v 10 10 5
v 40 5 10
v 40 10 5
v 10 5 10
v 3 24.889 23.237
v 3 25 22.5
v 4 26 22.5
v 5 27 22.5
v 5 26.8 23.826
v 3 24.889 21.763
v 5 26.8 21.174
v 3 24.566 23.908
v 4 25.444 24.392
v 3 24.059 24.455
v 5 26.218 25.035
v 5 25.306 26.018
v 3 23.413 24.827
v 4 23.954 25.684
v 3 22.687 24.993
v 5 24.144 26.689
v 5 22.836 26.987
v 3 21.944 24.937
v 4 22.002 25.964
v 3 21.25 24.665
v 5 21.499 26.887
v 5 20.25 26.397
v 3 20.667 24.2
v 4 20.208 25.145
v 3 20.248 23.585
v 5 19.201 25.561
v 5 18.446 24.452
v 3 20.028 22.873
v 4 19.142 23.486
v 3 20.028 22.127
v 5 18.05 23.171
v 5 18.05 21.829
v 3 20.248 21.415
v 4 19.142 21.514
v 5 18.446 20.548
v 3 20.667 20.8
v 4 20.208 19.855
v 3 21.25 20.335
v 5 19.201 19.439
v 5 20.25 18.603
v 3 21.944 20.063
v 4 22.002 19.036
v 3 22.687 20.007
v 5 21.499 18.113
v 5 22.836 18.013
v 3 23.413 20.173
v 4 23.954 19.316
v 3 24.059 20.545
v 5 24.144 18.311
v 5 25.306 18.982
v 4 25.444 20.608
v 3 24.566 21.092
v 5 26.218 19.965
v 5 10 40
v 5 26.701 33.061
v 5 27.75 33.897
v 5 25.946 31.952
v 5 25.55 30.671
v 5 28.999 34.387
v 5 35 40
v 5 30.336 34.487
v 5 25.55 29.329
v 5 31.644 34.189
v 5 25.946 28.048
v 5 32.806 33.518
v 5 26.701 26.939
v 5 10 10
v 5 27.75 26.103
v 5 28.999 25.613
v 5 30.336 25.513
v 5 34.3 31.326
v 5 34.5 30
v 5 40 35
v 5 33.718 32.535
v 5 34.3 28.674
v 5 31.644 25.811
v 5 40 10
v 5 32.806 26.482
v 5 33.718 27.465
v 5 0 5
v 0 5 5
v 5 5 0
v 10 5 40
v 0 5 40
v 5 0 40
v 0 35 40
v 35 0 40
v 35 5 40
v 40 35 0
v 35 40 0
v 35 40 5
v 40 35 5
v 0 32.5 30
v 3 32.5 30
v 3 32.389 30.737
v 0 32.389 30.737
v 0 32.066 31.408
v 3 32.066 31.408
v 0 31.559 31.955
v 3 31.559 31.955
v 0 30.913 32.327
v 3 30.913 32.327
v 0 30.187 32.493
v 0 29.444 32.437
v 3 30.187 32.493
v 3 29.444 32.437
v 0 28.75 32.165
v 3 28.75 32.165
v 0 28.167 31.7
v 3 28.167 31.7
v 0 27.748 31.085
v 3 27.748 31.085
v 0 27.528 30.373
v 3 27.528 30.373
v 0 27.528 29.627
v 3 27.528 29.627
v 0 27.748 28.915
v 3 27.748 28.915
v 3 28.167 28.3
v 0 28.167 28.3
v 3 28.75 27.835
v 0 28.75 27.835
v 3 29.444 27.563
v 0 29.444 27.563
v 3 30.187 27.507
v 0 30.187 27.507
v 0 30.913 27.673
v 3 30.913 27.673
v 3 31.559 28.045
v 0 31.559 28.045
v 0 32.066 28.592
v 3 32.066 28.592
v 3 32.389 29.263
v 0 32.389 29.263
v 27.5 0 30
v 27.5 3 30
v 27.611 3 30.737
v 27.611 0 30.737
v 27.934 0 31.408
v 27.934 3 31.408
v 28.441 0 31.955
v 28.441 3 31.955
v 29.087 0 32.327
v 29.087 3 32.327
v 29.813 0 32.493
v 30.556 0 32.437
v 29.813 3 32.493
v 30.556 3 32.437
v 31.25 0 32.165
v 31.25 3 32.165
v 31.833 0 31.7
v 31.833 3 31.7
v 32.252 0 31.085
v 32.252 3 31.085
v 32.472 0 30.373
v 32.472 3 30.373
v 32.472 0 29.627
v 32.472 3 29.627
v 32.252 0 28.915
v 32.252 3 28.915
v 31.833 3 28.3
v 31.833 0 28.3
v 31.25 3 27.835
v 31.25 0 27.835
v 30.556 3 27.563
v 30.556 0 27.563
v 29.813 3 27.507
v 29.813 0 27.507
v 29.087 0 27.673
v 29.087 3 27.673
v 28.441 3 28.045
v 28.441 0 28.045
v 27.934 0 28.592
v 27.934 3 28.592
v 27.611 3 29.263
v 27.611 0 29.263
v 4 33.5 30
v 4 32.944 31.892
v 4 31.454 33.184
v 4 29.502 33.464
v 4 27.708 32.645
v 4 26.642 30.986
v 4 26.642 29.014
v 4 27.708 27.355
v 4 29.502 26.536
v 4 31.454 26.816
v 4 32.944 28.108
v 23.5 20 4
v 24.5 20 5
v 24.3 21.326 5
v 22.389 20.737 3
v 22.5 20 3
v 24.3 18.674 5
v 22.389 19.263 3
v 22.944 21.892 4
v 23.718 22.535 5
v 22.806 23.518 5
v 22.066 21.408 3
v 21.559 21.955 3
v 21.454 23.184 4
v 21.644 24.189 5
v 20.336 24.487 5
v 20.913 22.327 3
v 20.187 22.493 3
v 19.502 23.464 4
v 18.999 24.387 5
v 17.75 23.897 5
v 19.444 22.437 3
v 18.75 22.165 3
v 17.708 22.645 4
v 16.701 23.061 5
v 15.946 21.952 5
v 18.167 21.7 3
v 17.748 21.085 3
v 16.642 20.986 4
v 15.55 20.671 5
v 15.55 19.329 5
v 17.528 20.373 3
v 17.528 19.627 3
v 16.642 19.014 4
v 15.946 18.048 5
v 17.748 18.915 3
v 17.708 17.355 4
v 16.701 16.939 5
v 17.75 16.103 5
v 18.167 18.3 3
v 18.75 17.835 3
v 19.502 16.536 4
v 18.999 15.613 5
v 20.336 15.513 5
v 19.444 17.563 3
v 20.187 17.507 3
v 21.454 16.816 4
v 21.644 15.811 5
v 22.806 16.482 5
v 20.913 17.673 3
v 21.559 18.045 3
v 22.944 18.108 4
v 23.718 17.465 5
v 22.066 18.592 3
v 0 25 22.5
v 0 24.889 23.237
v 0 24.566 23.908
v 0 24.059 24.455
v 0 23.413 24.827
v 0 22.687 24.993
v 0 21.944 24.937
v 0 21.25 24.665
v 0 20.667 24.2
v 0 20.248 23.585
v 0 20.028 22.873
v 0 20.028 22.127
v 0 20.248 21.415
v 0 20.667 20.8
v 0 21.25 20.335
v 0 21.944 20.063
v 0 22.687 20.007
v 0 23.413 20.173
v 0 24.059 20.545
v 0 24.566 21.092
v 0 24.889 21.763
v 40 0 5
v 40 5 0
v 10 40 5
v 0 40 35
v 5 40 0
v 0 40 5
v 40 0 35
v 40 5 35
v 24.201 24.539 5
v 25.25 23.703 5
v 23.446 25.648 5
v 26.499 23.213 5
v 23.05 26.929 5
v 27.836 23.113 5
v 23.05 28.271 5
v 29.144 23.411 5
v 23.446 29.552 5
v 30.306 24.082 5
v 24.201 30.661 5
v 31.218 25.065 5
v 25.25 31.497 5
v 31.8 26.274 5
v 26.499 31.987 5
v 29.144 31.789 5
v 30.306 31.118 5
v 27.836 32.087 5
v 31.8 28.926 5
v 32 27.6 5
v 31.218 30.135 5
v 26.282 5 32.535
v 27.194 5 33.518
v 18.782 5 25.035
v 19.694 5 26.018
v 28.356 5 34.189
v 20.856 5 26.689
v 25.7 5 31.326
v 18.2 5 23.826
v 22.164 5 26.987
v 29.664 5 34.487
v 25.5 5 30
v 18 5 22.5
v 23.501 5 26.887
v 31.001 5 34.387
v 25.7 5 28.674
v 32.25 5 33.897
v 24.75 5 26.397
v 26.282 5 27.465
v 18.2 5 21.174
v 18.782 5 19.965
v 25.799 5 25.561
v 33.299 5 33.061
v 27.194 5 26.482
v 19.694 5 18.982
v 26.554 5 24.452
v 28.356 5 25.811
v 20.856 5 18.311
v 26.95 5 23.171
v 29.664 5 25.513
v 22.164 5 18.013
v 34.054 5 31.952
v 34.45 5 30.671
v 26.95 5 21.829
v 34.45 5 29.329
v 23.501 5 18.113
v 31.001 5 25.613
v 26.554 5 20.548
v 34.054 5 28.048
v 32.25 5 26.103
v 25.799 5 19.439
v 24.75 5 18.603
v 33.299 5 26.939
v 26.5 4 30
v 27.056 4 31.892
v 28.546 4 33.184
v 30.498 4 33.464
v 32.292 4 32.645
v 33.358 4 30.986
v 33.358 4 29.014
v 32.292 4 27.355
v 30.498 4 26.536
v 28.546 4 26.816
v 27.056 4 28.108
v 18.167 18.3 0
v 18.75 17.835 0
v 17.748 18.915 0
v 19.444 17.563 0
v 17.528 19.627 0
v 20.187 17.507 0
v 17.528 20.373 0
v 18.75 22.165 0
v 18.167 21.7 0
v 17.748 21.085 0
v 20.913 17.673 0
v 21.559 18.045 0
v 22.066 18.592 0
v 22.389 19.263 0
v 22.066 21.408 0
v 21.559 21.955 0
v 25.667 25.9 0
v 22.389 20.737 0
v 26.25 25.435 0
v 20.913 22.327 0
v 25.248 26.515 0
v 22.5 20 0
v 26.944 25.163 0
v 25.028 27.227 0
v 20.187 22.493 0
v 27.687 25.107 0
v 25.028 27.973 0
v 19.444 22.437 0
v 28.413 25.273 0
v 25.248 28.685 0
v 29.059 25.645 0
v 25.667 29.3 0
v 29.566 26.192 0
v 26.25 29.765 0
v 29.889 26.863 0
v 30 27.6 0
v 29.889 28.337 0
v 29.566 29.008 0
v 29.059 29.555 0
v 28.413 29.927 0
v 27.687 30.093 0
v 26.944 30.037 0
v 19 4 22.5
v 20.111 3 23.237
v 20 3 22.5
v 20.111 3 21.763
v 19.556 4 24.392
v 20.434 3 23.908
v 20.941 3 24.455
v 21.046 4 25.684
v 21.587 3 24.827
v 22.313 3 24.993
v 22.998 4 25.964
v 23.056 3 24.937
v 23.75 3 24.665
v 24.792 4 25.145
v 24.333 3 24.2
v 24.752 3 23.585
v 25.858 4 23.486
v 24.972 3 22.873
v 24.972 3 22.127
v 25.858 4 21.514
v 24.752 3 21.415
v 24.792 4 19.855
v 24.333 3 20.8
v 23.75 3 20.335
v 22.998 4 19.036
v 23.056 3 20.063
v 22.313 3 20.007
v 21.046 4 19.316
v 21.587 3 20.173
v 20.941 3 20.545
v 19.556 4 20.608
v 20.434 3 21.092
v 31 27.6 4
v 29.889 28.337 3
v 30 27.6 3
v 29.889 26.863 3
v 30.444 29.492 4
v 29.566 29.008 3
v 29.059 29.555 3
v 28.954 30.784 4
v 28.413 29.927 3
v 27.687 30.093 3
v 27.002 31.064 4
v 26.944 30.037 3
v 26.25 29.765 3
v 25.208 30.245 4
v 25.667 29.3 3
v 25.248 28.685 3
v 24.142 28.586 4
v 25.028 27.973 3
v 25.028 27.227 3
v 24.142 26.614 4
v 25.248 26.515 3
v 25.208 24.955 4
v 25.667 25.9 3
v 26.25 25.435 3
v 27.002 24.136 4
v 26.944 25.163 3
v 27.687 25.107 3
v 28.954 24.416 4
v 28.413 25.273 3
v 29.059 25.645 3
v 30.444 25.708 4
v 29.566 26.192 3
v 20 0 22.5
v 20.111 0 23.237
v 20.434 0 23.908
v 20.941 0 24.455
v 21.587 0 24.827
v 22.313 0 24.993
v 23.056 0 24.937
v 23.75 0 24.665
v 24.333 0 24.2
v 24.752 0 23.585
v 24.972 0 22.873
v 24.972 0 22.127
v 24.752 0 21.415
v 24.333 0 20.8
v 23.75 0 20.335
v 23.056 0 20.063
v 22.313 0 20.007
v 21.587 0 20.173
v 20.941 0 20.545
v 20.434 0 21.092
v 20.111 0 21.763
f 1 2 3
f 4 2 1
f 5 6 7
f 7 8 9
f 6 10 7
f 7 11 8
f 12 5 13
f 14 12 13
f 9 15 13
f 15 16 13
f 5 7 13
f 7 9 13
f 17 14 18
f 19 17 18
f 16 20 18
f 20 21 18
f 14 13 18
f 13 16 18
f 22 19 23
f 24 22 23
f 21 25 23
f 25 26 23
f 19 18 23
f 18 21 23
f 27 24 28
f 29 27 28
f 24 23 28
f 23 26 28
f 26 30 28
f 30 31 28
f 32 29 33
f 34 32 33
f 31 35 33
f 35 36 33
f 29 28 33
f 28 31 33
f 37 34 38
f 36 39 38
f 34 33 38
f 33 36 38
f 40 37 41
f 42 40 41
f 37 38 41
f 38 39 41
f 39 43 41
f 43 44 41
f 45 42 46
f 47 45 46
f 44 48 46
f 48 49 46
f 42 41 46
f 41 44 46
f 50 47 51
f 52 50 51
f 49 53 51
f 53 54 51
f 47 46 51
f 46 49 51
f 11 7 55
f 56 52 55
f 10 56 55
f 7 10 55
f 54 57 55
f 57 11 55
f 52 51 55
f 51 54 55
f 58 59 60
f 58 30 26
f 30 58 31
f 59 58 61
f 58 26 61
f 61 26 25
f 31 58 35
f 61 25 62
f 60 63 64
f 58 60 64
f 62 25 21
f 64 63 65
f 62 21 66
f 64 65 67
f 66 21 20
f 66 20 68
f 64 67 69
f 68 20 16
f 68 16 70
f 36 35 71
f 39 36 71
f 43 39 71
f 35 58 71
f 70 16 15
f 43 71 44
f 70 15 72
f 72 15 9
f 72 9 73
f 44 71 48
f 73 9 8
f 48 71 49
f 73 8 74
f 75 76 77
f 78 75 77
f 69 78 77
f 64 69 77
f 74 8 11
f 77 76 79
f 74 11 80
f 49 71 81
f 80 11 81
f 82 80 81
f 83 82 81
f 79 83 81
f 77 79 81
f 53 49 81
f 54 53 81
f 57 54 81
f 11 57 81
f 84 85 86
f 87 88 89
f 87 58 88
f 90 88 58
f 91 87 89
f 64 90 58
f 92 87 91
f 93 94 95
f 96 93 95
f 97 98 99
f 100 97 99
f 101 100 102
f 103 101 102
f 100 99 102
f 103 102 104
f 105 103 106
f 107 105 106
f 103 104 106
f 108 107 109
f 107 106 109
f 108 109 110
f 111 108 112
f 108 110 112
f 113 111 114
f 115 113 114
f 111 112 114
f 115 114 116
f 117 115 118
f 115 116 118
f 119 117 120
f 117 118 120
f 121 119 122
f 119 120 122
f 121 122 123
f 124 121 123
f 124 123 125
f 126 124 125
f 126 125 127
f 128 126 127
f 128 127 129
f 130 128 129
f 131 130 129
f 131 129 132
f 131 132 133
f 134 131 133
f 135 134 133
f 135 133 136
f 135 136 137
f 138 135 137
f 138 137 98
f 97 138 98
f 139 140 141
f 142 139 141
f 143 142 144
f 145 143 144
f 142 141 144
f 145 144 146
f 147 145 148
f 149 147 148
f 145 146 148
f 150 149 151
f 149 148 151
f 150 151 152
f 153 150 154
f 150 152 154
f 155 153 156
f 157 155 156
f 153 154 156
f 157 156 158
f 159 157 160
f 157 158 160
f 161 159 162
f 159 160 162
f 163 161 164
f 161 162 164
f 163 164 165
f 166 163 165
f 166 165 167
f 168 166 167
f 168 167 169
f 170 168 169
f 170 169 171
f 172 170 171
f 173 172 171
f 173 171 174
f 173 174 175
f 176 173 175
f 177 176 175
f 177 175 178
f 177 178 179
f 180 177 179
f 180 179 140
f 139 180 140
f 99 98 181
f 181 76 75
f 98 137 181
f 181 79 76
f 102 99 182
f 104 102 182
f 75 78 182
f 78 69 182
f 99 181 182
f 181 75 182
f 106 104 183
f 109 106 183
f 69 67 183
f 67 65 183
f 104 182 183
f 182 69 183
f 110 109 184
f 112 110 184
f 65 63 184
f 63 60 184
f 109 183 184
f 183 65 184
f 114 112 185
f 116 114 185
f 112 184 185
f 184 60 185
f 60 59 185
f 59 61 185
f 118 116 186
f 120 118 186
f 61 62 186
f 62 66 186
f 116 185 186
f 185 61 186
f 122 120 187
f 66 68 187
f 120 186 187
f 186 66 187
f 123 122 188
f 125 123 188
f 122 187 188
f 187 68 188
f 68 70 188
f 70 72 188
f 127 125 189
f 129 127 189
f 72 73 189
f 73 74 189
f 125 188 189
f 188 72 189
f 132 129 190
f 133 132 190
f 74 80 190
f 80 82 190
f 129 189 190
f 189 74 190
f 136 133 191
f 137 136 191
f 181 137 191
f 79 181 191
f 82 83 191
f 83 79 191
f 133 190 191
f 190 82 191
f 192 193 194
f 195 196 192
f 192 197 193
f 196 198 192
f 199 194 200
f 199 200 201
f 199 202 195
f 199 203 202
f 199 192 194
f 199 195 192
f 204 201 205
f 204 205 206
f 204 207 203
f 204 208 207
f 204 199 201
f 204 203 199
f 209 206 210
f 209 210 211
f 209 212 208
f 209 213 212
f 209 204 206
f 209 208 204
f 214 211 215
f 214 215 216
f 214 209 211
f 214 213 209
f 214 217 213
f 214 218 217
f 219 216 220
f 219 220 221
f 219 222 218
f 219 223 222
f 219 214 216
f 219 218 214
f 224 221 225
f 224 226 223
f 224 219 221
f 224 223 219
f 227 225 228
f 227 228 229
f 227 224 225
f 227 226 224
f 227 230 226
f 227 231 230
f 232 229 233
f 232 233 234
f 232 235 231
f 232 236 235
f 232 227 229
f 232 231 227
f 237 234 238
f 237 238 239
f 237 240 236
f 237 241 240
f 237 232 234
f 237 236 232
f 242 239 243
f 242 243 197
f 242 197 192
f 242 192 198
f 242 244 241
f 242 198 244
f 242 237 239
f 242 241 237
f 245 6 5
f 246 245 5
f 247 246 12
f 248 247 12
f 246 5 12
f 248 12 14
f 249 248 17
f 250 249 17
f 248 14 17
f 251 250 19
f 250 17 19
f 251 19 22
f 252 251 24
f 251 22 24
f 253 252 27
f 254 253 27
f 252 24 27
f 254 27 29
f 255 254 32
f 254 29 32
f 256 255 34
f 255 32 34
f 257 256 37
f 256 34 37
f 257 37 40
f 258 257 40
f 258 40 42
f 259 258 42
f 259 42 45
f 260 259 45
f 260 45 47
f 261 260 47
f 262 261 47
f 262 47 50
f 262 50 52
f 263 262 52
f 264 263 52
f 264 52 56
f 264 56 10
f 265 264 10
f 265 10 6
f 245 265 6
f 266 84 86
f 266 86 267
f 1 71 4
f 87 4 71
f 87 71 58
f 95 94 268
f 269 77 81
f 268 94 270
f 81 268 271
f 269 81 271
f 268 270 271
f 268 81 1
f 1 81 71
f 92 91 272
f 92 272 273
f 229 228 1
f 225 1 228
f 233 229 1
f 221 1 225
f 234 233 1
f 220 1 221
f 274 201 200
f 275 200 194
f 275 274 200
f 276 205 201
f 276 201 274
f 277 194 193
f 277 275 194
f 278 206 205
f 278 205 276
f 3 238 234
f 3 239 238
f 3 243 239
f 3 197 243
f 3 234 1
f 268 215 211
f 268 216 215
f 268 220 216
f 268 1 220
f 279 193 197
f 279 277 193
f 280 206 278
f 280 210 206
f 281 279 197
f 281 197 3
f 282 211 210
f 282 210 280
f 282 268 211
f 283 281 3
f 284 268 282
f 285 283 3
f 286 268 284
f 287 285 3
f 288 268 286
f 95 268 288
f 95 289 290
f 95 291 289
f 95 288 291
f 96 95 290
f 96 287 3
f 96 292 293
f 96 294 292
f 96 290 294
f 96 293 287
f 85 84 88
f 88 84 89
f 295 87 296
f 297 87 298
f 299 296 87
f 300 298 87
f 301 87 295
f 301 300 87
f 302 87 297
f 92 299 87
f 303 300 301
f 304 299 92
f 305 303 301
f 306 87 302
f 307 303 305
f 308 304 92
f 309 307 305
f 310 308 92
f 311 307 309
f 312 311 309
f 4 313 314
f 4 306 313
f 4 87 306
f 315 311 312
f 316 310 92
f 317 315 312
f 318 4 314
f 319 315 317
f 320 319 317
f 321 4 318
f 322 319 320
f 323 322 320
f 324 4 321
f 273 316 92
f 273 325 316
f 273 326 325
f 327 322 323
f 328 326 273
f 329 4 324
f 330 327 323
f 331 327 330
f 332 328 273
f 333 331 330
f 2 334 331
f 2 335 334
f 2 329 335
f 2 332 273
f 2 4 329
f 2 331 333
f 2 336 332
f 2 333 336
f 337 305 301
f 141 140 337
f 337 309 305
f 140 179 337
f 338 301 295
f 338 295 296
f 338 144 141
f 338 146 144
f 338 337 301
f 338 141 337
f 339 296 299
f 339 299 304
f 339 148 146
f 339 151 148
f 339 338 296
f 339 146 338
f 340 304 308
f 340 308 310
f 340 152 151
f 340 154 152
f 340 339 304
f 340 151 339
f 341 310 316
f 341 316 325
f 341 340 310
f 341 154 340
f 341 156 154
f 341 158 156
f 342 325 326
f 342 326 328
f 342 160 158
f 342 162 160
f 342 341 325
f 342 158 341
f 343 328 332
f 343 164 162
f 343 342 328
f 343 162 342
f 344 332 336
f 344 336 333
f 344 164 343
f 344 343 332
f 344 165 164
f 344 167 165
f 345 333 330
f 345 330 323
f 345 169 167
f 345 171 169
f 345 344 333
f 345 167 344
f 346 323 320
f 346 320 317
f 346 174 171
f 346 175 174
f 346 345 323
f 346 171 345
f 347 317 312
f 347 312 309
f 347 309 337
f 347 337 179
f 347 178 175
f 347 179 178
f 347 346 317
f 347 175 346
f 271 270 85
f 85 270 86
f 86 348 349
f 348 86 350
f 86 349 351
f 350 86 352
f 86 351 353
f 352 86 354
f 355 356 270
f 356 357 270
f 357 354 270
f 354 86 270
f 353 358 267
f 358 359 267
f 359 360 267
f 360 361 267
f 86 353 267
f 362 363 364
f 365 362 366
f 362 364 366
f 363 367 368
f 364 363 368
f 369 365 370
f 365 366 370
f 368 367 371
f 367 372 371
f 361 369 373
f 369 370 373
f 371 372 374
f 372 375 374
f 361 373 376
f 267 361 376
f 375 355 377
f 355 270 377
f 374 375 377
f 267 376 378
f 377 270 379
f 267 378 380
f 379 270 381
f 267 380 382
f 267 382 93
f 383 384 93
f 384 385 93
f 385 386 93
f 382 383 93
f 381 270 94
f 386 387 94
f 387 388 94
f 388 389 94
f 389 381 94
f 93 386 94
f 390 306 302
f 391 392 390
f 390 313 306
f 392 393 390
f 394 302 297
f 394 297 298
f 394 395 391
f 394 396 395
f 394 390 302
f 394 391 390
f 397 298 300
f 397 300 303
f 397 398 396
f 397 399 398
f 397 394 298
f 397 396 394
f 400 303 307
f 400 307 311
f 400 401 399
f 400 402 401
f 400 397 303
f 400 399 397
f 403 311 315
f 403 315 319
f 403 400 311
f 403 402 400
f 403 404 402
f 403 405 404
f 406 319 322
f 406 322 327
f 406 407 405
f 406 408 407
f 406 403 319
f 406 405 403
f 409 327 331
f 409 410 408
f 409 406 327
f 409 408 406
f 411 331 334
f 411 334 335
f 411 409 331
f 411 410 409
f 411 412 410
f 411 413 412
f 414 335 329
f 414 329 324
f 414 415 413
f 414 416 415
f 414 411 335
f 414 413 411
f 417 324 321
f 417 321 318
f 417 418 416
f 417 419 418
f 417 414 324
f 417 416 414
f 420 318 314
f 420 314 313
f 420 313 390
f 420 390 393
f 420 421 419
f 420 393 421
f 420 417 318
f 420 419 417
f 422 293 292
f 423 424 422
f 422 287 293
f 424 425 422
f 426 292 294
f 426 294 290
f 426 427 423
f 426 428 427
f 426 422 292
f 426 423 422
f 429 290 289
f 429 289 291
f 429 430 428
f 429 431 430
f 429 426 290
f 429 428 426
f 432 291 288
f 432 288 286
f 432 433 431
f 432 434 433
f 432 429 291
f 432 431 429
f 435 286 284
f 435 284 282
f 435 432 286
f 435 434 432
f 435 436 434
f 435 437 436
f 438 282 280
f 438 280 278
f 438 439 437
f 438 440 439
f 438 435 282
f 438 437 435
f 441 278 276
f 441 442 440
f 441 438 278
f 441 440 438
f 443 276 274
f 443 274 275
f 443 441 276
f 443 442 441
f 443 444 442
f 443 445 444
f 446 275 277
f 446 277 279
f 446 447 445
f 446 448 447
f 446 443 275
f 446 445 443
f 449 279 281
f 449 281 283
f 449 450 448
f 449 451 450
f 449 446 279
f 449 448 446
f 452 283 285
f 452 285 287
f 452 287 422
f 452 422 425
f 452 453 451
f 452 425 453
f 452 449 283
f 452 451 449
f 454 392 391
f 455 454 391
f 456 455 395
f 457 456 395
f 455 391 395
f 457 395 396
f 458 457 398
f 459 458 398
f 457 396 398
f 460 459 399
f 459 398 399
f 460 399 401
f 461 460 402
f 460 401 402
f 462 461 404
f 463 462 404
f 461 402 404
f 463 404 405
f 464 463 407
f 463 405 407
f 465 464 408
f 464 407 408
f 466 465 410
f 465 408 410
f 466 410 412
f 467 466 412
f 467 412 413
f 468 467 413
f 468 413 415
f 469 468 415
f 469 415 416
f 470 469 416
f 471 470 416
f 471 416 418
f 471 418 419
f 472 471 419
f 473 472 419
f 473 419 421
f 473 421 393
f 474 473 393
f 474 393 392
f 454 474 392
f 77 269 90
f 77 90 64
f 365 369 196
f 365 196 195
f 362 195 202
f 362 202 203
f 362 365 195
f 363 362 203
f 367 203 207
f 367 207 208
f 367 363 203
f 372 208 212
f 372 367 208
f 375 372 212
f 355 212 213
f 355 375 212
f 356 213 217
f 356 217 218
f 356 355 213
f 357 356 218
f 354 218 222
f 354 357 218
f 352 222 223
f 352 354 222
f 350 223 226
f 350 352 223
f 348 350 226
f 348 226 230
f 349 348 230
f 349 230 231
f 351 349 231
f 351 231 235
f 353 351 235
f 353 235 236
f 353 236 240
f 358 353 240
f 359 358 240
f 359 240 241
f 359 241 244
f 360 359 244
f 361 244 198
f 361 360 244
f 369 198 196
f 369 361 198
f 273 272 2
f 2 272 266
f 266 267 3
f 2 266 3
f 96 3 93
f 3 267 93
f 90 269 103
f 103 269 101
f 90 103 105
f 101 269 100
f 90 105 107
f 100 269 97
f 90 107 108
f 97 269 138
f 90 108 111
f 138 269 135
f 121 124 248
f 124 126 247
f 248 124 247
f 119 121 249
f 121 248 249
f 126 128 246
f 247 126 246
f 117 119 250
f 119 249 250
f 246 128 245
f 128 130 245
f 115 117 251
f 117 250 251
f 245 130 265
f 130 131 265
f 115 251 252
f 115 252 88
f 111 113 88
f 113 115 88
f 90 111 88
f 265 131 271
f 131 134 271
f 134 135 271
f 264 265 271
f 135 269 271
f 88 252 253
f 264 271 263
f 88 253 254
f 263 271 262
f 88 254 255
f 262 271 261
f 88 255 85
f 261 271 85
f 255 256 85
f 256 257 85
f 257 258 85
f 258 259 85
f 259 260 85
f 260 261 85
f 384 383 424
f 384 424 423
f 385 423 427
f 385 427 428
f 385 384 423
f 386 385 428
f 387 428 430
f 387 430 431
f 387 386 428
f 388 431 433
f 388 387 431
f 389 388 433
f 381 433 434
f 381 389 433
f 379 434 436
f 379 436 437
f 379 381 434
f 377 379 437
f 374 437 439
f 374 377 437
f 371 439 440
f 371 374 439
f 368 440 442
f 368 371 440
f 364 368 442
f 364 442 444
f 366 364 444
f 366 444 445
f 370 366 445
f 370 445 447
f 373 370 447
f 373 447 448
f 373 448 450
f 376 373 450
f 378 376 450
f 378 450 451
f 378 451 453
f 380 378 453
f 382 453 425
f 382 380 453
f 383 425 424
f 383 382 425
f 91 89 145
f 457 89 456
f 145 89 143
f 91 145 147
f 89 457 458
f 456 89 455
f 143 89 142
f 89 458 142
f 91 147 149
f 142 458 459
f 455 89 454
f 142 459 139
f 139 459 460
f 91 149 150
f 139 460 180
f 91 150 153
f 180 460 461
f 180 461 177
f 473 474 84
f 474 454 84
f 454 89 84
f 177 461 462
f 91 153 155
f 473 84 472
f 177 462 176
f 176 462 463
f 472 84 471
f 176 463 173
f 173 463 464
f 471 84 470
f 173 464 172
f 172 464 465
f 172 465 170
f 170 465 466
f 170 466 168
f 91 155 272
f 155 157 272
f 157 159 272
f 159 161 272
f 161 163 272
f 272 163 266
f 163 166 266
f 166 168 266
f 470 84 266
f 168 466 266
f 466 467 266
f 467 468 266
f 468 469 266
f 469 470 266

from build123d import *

# Parameters (mm, degrees)
F0_W     = 5
F0_H     = 35
F0_H_2   = 5
F0_W_2   = 35
F0_R     = 2.5
F1_DEPTH = 5
F2_DEPTH = 40
F3_SIZE  = 5
F4_R     = 2.5
F5_DEPTH = 25
F6_R     = 2.5
F7_DEPTH = 25
F8_SIZE  = 2


with BuildPart() as f1:
    # F0 (on Top) → F1 (new body)
    with BuildSketch(Plane.XY):
        with Locations((2.5, 22.5)):
            Rectangle(F0_W, F0_H)
        with Locations((2.5, 2.5)):
            Rectangle(F0_W, F0_H_2)
        with Locations((22.5, 2.5)):
            Rectangle(F0_W_2, F0_H_2)
        with Locations((22.5, 22.5)):
            Rectangle(F0_W_2, F0_H)
        with Locations((20, 20)):
            Circle(F0_R, mode=Mode.SUBTRACT)
        with Locations((27.5, 20)):
            Circle(F0_R, mode=Mode.SUBTRACT)
        with Locations((20, 27.6)):
            Circle(F0_R, mode=Mode.SUBTRACT)
        with Locations((27.5, 27.6)):
            Circle(F0_R, mode=Mode.SUBTRACT)
        with Locations((20, 27.6)):
            Circle(F0_R)
        with Locations((27.5, 20)):
            Circle(F0_R)
    extrude(amount=F1_DEPTH)

    # F0 (on Top) → F2 (join)
    with BuildSketch(Plane.XY):
        with Locations((2.5, 22.5)):
            Rectangle(F0_W, F0_H)
        with Locations((2.5, 2.5)):
            Rectangle(F0_W, F0_H_2)
        with Locations((22.5, 2.5)):
            Rectangle(F0_W_2, F0_H_2)
    extrude(amount=F2_DEPTH)

    # F3
    f3_edges = [f1.edges().sort_by_distance(p)[0] for p in [
        (40, 40, 2.5),
        (2.5, 40, 40),
        (40, 2.5, 40),
        (0, 0, 20),
        (0, 20, 0),
        (20, 0, 0),
        (5, 22.5, 5),
        (5, 5, 22.5),
        (22.5, 5, 5),
    ]]
    chamfer(f3_edges, length=F3_SIZE)

    # F4 (on face) → F5 (cut)
    with BuildSketch(Plane.YZ.offset(5)):
        with Locations((30, 30)):
            Circle(F4_R)
        with Locations((22.5, 22.5)):
            Circle(F4_R)
    extrude(amount=-F5_DEPTH, mode=Mode.SUBTRACT)

    # F6 (on face) → F7 (cut)
    with BuildSketch(Plane(origin=(0, 5, 0), x_dir=(-1, 0, 0), z_dir=(0, 1, 0))):
        with Locations((-22.5, 22.5)):
            Circle(F6_R)
        with Locations((-30, 30)):
            Circle(F6_R)
    extrude(amount=-F7_DEPTH, mode=Mode.SUBTRACT)

    # F8
    f8_edges = [f1.edges().sort_by_distance(p)[0] for p in [
        (5, 27.5, 30),
        (5, 20, 22.5),
        (25, 5, 22.5),
        (32.5, 5, 30),
        (17.5, 20, 5),
        (25, 27.6, 5),
    ]]
    chamfer(f8_edges, length=F8_SIZE)


solid = f1.part
